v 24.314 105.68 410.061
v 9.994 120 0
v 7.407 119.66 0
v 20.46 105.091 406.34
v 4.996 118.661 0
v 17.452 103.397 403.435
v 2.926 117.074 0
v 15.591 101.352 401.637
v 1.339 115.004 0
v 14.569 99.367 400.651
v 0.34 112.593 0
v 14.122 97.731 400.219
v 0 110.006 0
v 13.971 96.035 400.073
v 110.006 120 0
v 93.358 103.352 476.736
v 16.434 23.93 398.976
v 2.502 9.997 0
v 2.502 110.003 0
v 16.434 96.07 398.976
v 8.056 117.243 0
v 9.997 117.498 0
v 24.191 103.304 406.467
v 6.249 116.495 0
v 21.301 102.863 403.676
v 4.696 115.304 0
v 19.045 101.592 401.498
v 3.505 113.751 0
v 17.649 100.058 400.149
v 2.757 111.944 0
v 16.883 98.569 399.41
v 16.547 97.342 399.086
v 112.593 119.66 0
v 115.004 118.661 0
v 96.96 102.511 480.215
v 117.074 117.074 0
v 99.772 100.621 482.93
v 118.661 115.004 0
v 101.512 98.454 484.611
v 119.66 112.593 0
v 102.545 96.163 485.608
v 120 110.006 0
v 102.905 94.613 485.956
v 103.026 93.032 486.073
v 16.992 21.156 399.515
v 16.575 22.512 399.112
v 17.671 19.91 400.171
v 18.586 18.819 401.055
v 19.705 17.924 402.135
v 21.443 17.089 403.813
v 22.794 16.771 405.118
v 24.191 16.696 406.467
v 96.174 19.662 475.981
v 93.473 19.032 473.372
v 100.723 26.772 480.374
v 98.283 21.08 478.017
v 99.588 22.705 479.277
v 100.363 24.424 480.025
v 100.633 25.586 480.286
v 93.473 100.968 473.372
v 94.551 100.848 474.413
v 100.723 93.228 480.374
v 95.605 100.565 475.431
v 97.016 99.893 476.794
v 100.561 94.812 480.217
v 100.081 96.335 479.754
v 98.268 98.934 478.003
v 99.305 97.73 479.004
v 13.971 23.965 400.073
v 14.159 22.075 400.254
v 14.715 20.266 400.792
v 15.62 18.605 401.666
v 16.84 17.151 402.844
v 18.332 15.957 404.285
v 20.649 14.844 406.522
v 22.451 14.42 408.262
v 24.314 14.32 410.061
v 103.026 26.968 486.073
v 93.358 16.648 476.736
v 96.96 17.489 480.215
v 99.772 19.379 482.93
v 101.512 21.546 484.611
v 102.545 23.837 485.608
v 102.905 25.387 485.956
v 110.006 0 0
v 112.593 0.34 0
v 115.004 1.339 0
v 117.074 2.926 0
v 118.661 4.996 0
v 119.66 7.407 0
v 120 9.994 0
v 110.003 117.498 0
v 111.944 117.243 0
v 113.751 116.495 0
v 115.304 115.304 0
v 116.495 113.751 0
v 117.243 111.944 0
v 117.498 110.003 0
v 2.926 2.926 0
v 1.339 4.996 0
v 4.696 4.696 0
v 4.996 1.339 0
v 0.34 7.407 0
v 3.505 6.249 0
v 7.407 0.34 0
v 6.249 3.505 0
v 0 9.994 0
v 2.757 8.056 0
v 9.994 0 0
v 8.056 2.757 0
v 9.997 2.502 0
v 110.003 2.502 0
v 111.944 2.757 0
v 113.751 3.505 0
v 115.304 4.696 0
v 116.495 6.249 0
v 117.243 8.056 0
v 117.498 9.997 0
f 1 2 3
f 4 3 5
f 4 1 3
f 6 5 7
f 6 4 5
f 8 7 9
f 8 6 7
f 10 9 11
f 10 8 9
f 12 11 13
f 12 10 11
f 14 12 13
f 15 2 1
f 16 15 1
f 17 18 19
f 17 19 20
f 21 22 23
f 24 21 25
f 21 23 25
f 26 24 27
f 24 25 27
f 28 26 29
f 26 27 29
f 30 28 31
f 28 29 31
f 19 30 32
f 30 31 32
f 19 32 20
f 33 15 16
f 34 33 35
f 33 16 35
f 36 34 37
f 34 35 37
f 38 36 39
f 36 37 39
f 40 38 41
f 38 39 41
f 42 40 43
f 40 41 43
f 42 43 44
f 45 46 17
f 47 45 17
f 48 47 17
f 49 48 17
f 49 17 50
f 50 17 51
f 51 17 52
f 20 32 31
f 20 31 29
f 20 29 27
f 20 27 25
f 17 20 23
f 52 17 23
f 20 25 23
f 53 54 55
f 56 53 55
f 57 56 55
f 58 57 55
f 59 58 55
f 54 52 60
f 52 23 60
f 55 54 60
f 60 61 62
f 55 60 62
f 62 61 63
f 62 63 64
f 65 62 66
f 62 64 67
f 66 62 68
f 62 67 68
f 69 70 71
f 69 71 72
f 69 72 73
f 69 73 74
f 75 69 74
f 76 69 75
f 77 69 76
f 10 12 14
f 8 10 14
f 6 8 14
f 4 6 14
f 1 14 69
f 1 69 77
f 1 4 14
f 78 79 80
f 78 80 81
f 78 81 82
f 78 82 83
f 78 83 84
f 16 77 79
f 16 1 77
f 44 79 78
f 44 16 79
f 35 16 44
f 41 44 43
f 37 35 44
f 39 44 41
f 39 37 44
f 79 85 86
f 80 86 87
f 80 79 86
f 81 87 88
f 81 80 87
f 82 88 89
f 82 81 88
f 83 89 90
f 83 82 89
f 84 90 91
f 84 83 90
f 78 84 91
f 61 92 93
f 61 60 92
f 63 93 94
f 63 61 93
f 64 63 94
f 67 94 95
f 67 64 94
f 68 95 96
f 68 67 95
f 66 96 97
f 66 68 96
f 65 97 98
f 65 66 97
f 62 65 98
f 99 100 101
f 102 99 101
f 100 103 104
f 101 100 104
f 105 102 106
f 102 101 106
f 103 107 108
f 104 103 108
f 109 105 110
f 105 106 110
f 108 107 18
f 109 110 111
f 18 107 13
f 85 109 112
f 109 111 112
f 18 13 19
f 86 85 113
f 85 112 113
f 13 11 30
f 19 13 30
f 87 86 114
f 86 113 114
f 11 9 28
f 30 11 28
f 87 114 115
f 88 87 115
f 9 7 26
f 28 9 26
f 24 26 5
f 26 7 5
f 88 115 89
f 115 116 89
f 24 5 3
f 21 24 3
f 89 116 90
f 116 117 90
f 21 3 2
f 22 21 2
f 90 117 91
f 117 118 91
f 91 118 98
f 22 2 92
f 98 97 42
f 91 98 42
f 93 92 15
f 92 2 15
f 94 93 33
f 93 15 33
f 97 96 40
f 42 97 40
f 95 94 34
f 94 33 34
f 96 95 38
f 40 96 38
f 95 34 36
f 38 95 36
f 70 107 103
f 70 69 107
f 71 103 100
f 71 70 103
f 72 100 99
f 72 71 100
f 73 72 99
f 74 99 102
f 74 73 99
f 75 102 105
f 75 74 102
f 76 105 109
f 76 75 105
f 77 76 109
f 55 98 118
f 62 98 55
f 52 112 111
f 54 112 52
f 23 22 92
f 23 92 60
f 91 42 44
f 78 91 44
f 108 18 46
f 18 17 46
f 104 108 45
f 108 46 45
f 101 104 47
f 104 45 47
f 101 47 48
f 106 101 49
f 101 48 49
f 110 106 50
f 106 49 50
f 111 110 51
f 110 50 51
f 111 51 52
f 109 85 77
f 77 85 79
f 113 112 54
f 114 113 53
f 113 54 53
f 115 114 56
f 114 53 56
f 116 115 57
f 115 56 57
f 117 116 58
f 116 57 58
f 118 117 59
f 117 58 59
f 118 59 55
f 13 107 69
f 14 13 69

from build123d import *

# Parameters (mm, degrees)
F2_DEPTH    = 520
F2_TAPER    = 2
F3_T1_DEPTH = 701.1716597564
F4_R        = 10
F5_T        = -2.5


# Not quite as in the source:
# - a fillet or chamfer that OpenCascade refuses, or shapes differently, is made with other operations: its cross-section is extruded or revolved along the edge and cut away or added


with BuildPart() as f2:
    # F0 (on Top) → F2 (new body)
    with BuildSketch(Plane.XY):
        Polygon((120, 120), (0, 120), (60, 60), align=None)
        Polygon((60, 60), (120, 0), (120, 120), align=None)
        Polygon((60, 60), (0, 0), (120, 0), align=None)
        Polygon((0, 120), (0, 0), (60, 60), align=None)
    extrude(amount=F2_DEPTH, taper=F2_TAPER)

    # F3: chamfer of 120 on 1 edges, made by hand

    # F3_s2 → F3_t1 (cut)
    with BuildSketch(Plane.XZ.offset(-410.5858298782)):
        Polygon((13.9708605314, 400.0731007577), (138.1588001357, 520), (18.1588001357, 520), align=None)
    extrude(amount=F3_T1_DEPTH, mode=Mode.SUBTRACT)

    # F4
    f4_edges = [f2.edges().sort_by_distance(p)[0] for p in [
        (6.98543, 6.98543, 200.03655),
        (6.98543, 113.01457, 200.03655),
        (111.512985, 8.487015, 243.03631),
        (111.512985, 111.512985, 243.03631),
    ]]
    fillet(f4_edges, radius=F4_R)

    # F5
    f5_openings = [f2.faces().sort_by_distance(p)[0] for p in [
        (60, 60, 0),
    ]]
    offset(amount=F5_T, openings=f5_openings)


solid = f2.part
